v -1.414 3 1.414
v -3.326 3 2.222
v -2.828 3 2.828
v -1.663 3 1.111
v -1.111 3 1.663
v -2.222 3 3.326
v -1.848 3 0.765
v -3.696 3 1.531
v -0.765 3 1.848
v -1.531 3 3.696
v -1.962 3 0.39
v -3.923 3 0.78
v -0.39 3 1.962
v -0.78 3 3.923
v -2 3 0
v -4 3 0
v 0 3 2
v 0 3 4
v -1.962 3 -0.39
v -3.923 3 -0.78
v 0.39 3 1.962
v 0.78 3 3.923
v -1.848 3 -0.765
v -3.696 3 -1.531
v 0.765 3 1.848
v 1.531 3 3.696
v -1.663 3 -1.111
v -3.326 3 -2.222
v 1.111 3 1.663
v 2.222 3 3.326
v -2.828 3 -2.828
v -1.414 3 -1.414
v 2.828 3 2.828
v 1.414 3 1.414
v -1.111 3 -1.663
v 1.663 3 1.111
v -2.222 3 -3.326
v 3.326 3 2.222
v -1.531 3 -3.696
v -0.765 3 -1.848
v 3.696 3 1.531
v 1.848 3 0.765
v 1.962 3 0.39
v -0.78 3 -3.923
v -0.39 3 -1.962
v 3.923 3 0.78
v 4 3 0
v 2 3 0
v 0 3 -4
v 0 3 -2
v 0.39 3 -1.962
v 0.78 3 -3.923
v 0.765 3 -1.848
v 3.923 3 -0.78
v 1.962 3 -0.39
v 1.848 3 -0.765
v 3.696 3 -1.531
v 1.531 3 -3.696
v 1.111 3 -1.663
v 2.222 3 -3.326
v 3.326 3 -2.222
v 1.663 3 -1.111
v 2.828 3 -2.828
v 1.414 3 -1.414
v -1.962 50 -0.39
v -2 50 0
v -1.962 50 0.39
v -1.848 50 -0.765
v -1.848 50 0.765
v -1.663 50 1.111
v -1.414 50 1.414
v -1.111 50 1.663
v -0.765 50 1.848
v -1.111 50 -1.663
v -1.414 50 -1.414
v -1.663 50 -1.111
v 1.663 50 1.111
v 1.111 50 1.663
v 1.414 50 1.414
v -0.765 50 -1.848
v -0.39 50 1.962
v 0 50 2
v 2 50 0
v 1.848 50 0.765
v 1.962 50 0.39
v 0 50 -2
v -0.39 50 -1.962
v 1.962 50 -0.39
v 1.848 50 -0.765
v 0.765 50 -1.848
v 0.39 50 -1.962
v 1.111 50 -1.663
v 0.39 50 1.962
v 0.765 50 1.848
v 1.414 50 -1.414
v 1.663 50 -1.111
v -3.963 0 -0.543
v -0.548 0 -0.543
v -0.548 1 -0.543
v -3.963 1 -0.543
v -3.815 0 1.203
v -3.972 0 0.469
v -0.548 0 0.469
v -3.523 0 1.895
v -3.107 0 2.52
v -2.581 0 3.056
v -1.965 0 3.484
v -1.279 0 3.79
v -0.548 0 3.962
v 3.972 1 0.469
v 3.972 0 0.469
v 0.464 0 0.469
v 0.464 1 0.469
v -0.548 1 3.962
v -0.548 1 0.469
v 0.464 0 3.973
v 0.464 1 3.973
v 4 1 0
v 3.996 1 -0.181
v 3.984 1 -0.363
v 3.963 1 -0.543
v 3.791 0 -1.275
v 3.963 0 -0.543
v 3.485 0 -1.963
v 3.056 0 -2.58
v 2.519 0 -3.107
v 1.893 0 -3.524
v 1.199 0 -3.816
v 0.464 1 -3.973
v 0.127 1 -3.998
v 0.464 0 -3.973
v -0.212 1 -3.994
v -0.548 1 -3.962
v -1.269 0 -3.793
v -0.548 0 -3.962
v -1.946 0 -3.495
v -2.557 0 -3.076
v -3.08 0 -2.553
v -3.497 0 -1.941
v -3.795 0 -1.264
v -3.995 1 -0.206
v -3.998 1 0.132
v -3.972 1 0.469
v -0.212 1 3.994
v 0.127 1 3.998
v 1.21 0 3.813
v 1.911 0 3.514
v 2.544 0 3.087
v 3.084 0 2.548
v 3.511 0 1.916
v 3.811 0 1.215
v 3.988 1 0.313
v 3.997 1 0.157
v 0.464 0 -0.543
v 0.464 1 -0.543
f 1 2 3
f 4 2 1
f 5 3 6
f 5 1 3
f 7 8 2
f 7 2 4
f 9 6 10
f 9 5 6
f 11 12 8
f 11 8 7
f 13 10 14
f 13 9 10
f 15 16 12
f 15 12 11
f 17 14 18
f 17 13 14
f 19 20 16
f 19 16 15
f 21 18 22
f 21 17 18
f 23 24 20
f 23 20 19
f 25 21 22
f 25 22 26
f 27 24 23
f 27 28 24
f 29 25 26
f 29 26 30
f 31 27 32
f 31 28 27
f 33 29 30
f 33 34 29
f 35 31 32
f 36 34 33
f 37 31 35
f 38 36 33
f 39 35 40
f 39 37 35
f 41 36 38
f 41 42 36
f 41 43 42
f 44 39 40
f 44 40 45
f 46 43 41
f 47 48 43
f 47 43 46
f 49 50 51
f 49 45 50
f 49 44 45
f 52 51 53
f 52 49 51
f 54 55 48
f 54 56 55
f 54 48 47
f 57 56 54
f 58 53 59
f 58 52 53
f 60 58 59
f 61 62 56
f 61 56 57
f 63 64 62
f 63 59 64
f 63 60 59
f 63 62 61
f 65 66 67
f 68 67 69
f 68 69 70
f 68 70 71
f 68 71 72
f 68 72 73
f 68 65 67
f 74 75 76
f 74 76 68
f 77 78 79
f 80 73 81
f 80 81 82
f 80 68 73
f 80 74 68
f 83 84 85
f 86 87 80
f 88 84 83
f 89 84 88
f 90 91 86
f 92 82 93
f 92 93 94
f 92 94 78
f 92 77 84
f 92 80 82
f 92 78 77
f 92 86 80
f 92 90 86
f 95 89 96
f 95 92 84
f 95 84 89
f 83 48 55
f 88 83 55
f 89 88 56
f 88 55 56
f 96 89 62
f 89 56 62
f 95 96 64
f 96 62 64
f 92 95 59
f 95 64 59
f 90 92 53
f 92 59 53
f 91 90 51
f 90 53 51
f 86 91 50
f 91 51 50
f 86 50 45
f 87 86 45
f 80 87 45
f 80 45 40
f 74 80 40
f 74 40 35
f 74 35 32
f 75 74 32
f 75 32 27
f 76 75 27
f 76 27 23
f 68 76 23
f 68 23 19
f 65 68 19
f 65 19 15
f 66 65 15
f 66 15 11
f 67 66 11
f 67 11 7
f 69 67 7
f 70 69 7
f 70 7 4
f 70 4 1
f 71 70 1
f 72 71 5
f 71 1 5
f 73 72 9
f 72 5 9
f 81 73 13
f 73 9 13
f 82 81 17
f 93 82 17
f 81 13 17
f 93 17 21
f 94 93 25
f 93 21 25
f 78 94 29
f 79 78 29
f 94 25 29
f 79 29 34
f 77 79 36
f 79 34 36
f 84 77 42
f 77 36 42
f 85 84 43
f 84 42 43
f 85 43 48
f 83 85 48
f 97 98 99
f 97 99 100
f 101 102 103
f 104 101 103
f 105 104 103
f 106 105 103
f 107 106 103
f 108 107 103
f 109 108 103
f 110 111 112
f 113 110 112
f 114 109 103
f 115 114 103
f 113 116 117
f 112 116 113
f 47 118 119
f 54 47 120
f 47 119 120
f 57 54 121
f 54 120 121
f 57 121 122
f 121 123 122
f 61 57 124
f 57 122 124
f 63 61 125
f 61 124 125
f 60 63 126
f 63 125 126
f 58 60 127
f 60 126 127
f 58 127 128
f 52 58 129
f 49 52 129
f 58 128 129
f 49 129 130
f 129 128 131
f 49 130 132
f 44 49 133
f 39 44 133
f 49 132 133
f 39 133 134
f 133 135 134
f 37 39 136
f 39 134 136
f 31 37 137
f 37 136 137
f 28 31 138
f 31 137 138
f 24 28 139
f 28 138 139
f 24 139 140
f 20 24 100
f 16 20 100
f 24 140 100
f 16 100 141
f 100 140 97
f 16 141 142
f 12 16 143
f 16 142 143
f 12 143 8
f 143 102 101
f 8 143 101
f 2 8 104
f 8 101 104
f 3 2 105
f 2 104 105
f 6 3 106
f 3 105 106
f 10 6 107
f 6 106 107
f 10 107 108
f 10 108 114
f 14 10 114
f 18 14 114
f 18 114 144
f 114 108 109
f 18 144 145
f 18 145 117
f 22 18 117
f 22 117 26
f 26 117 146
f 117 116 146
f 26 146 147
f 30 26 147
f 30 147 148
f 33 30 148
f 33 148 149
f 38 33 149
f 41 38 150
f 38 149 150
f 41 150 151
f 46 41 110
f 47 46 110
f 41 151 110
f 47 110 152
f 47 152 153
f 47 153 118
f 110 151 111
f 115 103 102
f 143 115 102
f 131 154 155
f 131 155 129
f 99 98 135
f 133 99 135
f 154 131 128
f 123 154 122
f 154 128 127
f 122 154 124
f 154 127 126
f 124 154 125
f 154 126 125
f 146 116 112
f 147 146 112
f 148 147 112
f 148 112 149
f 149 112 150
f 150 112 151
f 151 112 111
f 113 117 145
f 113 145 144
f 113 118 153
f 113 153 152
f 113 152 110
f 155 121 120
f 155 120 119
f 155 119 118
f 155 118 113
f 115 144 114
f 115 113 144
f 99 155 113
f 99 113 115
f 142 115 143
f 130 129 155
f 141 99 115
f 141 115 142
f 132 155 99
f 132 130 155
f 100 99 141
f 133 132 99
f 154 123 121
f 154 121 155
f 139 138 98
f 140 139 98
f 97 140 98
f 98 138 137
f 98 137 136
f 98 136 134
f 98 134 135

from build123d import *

# Parameters (mm, degrees)
SKETCH1_R           = 4
SKETCH1_R_2         = 2
BOSS_EXTRUDE1_DEPTH = 3
SKETCH1_3_R         = 2
BOSS_EXTRUDE2_DEPTH = 50
CUT_EXTRUDE1_DEPTH  = 1


with BuildPart() as part:
    # Sketch1 → Boss-Extrude1 (new body)
    with BuildSketch(Plane(origin=(0, 0, 0), x_dir=(1, 0, 0), z_dir=(0, 1, 0))):
        Circle(SKETCH1_R)
        Circle(SKETCH1_R_2, mode=Mode.SUBTRACT)
    extrude(amount=BOSS_EXTRUDE1_DEPTH)

    # Sketch1<3> → Boss-Extrude2 (add)
    with BuildSketch(Plane(origin=(0, 0, 0), x_dir=(1, 0, 0), z_dir=(0, 1, 0))):
        Circle(SKETCH1_3_R)
    extrude(amount=BOSS_EXTRUDE2_DEPTH)

    # Sketch2 → Cut-Extrude1 (cut)
    with BuildSketch(Plane(origin=(0, 0, 0), x_dir=(-1, 0, 0), z_dir=(0, -1, 0))):
        with BuildLine():
            Line((0.548123782, 4.189984677), (-0.463797046, 4.189984677))
            Line((-0.463797046, 4.189984677), (-0.463797046, 0.542853361))
            Line((-0.463797046, 0.542853361), (-3.962992585, 0.542853361))
            ThreePointArc((-3.962992585, 0.542853361), (-3.999827093, 0.037191701), (-3.972401756, -0.469067467))
            Line((-3.972401756, -0.469067467), (-0.463797046, -0.469067467))
            Line((-0.463797046, -0.469067467), (-0.463797046, -4.337556464))
            Line((-0.463797046, -4.337556464), (0.548123782, -4.337556464))
            Line((0.548123782, -4.337556464), (0.548123782, -0.469067467))
            Line((0.548123782, -0.469067467), (3.972401756, -0.469067467))
            ThreePointArc((3.972401756, -0.469067467), (3.999827093, 0.037191701), (3.962992585, 0.542853361))
            Line((3.962992585, 0.542853361), (0.548123782, 0.542853361))
            Line((0.548123782, 0.542853361), (0.548123782, 4.189984677))
        make_face()
    extrude(amount=-CUT_EXTRUDE1_DEPTH, mode=Mode.SUBTRACT)


solid = part.part
